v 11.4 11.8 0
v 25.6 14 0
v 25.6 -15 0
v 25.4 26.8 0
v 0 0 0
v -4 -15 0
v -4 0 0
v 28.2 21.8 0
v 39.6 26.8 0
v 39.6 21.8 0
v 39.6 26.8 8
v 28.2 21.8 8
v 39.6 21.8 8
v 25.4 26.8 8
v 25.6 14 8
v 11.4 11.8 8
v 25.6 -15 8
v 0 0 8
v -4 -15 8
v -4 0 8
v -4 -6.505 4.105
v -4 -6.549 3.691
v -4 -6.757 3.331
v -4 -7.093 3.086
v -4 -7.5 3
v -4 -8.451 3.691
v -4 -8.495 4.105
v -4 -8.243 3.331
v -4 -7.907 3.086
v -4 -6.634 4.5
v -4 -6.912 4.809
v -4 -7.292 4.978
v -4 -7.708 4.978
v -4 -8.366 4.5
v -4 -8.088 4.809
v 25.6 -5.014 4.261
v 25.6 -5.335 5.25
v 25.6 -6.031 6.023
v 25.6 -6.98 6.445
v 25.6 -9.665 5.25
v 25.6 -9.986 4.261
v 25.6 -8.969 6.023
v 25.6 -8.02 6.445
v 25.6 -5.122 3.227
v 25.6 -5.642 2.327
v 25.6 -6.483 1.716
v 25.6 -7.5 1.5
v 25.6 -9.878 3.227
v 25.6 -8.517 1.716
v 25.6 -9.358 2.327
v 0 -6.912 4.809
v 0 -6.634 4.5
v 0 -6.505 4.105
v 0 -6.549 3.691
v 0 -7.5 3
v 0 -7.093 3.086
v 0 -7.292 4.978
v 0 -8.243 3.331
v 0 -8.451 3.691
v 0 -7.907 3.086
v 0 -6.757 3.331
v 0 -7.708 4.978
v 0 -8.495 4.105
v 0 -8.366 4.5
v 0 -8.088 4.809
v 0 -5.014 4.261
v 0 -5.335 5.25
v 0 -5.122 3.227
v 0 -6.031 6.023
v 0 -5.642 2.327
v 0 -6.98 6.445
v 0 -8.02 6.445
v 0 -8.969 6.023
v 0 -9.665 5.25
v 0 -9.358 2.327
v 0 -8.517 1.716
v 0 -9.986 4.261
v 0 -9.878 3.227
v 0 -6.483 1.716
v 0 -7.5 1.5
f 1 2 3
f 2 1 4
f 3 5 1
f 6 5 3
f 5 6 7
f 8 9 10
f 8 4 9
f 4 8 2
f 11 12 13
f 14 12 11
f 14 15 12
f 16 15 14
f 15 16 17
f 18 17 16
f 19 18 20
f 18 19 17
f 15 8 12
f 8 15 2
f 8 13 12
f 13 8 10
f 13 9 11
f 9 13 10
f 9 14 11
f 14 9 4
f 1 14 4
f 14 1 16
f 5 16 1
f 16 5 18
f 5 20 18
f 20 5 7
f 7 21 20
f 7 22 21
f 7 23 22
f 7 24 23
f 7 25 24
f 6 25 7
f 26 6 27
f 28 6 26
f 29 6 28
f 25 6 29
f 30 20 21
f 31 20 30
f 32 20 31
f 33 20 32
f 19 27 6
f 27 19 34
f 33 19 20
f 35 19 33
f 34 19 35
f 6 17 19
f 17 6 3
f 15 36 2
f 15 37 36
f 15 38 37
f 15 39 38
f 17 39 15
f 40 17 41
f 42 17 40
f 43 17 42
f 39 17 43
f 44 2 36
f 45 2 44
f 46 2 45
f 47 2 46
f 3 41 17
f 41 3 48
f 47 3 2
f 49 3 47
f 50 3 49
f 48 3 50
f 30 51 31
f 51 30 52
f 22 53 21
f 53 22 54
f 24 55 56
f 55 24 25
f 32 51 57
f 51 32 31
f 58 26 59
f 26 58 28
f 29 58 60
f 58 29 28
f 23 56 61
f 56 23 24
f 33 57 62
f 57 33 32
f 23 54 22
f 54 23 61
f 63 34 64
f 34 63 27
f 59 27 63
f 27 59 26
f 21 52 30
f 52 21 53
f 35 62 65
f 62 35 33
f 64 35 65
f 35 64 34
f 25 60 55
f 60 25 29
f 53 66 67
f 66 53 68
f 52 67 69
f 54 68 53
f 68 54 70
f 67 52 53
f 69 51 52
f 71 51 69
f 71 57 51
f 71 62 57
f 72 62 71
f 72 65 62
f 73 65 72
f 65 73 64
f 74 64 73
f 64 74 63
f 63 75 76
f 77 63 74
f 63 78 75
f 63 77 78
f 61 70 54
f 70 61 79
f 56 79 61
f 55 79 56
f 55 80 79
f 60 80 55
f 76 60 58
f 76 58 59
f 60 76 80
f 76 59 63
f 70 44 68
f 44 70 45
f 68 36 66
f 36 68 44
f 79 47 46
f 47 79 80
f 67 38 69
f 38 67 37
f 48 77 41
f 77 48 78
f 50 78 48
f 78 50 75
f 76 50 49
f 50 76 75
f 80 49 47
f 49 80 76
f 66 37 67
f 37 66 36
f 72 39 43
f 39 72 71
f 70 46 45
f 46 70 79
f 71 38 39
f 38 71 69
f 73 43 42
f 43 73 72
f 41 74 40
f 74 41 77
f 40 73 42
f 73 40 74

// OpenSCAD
difference(){
linear_extrude(height=8)
polygon([[25.6,-15],[25.6,14],[28.2,21.8],[39.6,21.8],[39.6,26.8],[25.4,26.8],[11.4,11.8],[0,0],[-4,0],[-4,-15]]);
translate([-10,-7.5,4])rotate([0,90,0])
    cylinder(d=2,h=40,$fn=15);
translate([0,-7.5,4])rotate([0,90,0])
    cylinder(d=5,h=40,$fn=15);
}
